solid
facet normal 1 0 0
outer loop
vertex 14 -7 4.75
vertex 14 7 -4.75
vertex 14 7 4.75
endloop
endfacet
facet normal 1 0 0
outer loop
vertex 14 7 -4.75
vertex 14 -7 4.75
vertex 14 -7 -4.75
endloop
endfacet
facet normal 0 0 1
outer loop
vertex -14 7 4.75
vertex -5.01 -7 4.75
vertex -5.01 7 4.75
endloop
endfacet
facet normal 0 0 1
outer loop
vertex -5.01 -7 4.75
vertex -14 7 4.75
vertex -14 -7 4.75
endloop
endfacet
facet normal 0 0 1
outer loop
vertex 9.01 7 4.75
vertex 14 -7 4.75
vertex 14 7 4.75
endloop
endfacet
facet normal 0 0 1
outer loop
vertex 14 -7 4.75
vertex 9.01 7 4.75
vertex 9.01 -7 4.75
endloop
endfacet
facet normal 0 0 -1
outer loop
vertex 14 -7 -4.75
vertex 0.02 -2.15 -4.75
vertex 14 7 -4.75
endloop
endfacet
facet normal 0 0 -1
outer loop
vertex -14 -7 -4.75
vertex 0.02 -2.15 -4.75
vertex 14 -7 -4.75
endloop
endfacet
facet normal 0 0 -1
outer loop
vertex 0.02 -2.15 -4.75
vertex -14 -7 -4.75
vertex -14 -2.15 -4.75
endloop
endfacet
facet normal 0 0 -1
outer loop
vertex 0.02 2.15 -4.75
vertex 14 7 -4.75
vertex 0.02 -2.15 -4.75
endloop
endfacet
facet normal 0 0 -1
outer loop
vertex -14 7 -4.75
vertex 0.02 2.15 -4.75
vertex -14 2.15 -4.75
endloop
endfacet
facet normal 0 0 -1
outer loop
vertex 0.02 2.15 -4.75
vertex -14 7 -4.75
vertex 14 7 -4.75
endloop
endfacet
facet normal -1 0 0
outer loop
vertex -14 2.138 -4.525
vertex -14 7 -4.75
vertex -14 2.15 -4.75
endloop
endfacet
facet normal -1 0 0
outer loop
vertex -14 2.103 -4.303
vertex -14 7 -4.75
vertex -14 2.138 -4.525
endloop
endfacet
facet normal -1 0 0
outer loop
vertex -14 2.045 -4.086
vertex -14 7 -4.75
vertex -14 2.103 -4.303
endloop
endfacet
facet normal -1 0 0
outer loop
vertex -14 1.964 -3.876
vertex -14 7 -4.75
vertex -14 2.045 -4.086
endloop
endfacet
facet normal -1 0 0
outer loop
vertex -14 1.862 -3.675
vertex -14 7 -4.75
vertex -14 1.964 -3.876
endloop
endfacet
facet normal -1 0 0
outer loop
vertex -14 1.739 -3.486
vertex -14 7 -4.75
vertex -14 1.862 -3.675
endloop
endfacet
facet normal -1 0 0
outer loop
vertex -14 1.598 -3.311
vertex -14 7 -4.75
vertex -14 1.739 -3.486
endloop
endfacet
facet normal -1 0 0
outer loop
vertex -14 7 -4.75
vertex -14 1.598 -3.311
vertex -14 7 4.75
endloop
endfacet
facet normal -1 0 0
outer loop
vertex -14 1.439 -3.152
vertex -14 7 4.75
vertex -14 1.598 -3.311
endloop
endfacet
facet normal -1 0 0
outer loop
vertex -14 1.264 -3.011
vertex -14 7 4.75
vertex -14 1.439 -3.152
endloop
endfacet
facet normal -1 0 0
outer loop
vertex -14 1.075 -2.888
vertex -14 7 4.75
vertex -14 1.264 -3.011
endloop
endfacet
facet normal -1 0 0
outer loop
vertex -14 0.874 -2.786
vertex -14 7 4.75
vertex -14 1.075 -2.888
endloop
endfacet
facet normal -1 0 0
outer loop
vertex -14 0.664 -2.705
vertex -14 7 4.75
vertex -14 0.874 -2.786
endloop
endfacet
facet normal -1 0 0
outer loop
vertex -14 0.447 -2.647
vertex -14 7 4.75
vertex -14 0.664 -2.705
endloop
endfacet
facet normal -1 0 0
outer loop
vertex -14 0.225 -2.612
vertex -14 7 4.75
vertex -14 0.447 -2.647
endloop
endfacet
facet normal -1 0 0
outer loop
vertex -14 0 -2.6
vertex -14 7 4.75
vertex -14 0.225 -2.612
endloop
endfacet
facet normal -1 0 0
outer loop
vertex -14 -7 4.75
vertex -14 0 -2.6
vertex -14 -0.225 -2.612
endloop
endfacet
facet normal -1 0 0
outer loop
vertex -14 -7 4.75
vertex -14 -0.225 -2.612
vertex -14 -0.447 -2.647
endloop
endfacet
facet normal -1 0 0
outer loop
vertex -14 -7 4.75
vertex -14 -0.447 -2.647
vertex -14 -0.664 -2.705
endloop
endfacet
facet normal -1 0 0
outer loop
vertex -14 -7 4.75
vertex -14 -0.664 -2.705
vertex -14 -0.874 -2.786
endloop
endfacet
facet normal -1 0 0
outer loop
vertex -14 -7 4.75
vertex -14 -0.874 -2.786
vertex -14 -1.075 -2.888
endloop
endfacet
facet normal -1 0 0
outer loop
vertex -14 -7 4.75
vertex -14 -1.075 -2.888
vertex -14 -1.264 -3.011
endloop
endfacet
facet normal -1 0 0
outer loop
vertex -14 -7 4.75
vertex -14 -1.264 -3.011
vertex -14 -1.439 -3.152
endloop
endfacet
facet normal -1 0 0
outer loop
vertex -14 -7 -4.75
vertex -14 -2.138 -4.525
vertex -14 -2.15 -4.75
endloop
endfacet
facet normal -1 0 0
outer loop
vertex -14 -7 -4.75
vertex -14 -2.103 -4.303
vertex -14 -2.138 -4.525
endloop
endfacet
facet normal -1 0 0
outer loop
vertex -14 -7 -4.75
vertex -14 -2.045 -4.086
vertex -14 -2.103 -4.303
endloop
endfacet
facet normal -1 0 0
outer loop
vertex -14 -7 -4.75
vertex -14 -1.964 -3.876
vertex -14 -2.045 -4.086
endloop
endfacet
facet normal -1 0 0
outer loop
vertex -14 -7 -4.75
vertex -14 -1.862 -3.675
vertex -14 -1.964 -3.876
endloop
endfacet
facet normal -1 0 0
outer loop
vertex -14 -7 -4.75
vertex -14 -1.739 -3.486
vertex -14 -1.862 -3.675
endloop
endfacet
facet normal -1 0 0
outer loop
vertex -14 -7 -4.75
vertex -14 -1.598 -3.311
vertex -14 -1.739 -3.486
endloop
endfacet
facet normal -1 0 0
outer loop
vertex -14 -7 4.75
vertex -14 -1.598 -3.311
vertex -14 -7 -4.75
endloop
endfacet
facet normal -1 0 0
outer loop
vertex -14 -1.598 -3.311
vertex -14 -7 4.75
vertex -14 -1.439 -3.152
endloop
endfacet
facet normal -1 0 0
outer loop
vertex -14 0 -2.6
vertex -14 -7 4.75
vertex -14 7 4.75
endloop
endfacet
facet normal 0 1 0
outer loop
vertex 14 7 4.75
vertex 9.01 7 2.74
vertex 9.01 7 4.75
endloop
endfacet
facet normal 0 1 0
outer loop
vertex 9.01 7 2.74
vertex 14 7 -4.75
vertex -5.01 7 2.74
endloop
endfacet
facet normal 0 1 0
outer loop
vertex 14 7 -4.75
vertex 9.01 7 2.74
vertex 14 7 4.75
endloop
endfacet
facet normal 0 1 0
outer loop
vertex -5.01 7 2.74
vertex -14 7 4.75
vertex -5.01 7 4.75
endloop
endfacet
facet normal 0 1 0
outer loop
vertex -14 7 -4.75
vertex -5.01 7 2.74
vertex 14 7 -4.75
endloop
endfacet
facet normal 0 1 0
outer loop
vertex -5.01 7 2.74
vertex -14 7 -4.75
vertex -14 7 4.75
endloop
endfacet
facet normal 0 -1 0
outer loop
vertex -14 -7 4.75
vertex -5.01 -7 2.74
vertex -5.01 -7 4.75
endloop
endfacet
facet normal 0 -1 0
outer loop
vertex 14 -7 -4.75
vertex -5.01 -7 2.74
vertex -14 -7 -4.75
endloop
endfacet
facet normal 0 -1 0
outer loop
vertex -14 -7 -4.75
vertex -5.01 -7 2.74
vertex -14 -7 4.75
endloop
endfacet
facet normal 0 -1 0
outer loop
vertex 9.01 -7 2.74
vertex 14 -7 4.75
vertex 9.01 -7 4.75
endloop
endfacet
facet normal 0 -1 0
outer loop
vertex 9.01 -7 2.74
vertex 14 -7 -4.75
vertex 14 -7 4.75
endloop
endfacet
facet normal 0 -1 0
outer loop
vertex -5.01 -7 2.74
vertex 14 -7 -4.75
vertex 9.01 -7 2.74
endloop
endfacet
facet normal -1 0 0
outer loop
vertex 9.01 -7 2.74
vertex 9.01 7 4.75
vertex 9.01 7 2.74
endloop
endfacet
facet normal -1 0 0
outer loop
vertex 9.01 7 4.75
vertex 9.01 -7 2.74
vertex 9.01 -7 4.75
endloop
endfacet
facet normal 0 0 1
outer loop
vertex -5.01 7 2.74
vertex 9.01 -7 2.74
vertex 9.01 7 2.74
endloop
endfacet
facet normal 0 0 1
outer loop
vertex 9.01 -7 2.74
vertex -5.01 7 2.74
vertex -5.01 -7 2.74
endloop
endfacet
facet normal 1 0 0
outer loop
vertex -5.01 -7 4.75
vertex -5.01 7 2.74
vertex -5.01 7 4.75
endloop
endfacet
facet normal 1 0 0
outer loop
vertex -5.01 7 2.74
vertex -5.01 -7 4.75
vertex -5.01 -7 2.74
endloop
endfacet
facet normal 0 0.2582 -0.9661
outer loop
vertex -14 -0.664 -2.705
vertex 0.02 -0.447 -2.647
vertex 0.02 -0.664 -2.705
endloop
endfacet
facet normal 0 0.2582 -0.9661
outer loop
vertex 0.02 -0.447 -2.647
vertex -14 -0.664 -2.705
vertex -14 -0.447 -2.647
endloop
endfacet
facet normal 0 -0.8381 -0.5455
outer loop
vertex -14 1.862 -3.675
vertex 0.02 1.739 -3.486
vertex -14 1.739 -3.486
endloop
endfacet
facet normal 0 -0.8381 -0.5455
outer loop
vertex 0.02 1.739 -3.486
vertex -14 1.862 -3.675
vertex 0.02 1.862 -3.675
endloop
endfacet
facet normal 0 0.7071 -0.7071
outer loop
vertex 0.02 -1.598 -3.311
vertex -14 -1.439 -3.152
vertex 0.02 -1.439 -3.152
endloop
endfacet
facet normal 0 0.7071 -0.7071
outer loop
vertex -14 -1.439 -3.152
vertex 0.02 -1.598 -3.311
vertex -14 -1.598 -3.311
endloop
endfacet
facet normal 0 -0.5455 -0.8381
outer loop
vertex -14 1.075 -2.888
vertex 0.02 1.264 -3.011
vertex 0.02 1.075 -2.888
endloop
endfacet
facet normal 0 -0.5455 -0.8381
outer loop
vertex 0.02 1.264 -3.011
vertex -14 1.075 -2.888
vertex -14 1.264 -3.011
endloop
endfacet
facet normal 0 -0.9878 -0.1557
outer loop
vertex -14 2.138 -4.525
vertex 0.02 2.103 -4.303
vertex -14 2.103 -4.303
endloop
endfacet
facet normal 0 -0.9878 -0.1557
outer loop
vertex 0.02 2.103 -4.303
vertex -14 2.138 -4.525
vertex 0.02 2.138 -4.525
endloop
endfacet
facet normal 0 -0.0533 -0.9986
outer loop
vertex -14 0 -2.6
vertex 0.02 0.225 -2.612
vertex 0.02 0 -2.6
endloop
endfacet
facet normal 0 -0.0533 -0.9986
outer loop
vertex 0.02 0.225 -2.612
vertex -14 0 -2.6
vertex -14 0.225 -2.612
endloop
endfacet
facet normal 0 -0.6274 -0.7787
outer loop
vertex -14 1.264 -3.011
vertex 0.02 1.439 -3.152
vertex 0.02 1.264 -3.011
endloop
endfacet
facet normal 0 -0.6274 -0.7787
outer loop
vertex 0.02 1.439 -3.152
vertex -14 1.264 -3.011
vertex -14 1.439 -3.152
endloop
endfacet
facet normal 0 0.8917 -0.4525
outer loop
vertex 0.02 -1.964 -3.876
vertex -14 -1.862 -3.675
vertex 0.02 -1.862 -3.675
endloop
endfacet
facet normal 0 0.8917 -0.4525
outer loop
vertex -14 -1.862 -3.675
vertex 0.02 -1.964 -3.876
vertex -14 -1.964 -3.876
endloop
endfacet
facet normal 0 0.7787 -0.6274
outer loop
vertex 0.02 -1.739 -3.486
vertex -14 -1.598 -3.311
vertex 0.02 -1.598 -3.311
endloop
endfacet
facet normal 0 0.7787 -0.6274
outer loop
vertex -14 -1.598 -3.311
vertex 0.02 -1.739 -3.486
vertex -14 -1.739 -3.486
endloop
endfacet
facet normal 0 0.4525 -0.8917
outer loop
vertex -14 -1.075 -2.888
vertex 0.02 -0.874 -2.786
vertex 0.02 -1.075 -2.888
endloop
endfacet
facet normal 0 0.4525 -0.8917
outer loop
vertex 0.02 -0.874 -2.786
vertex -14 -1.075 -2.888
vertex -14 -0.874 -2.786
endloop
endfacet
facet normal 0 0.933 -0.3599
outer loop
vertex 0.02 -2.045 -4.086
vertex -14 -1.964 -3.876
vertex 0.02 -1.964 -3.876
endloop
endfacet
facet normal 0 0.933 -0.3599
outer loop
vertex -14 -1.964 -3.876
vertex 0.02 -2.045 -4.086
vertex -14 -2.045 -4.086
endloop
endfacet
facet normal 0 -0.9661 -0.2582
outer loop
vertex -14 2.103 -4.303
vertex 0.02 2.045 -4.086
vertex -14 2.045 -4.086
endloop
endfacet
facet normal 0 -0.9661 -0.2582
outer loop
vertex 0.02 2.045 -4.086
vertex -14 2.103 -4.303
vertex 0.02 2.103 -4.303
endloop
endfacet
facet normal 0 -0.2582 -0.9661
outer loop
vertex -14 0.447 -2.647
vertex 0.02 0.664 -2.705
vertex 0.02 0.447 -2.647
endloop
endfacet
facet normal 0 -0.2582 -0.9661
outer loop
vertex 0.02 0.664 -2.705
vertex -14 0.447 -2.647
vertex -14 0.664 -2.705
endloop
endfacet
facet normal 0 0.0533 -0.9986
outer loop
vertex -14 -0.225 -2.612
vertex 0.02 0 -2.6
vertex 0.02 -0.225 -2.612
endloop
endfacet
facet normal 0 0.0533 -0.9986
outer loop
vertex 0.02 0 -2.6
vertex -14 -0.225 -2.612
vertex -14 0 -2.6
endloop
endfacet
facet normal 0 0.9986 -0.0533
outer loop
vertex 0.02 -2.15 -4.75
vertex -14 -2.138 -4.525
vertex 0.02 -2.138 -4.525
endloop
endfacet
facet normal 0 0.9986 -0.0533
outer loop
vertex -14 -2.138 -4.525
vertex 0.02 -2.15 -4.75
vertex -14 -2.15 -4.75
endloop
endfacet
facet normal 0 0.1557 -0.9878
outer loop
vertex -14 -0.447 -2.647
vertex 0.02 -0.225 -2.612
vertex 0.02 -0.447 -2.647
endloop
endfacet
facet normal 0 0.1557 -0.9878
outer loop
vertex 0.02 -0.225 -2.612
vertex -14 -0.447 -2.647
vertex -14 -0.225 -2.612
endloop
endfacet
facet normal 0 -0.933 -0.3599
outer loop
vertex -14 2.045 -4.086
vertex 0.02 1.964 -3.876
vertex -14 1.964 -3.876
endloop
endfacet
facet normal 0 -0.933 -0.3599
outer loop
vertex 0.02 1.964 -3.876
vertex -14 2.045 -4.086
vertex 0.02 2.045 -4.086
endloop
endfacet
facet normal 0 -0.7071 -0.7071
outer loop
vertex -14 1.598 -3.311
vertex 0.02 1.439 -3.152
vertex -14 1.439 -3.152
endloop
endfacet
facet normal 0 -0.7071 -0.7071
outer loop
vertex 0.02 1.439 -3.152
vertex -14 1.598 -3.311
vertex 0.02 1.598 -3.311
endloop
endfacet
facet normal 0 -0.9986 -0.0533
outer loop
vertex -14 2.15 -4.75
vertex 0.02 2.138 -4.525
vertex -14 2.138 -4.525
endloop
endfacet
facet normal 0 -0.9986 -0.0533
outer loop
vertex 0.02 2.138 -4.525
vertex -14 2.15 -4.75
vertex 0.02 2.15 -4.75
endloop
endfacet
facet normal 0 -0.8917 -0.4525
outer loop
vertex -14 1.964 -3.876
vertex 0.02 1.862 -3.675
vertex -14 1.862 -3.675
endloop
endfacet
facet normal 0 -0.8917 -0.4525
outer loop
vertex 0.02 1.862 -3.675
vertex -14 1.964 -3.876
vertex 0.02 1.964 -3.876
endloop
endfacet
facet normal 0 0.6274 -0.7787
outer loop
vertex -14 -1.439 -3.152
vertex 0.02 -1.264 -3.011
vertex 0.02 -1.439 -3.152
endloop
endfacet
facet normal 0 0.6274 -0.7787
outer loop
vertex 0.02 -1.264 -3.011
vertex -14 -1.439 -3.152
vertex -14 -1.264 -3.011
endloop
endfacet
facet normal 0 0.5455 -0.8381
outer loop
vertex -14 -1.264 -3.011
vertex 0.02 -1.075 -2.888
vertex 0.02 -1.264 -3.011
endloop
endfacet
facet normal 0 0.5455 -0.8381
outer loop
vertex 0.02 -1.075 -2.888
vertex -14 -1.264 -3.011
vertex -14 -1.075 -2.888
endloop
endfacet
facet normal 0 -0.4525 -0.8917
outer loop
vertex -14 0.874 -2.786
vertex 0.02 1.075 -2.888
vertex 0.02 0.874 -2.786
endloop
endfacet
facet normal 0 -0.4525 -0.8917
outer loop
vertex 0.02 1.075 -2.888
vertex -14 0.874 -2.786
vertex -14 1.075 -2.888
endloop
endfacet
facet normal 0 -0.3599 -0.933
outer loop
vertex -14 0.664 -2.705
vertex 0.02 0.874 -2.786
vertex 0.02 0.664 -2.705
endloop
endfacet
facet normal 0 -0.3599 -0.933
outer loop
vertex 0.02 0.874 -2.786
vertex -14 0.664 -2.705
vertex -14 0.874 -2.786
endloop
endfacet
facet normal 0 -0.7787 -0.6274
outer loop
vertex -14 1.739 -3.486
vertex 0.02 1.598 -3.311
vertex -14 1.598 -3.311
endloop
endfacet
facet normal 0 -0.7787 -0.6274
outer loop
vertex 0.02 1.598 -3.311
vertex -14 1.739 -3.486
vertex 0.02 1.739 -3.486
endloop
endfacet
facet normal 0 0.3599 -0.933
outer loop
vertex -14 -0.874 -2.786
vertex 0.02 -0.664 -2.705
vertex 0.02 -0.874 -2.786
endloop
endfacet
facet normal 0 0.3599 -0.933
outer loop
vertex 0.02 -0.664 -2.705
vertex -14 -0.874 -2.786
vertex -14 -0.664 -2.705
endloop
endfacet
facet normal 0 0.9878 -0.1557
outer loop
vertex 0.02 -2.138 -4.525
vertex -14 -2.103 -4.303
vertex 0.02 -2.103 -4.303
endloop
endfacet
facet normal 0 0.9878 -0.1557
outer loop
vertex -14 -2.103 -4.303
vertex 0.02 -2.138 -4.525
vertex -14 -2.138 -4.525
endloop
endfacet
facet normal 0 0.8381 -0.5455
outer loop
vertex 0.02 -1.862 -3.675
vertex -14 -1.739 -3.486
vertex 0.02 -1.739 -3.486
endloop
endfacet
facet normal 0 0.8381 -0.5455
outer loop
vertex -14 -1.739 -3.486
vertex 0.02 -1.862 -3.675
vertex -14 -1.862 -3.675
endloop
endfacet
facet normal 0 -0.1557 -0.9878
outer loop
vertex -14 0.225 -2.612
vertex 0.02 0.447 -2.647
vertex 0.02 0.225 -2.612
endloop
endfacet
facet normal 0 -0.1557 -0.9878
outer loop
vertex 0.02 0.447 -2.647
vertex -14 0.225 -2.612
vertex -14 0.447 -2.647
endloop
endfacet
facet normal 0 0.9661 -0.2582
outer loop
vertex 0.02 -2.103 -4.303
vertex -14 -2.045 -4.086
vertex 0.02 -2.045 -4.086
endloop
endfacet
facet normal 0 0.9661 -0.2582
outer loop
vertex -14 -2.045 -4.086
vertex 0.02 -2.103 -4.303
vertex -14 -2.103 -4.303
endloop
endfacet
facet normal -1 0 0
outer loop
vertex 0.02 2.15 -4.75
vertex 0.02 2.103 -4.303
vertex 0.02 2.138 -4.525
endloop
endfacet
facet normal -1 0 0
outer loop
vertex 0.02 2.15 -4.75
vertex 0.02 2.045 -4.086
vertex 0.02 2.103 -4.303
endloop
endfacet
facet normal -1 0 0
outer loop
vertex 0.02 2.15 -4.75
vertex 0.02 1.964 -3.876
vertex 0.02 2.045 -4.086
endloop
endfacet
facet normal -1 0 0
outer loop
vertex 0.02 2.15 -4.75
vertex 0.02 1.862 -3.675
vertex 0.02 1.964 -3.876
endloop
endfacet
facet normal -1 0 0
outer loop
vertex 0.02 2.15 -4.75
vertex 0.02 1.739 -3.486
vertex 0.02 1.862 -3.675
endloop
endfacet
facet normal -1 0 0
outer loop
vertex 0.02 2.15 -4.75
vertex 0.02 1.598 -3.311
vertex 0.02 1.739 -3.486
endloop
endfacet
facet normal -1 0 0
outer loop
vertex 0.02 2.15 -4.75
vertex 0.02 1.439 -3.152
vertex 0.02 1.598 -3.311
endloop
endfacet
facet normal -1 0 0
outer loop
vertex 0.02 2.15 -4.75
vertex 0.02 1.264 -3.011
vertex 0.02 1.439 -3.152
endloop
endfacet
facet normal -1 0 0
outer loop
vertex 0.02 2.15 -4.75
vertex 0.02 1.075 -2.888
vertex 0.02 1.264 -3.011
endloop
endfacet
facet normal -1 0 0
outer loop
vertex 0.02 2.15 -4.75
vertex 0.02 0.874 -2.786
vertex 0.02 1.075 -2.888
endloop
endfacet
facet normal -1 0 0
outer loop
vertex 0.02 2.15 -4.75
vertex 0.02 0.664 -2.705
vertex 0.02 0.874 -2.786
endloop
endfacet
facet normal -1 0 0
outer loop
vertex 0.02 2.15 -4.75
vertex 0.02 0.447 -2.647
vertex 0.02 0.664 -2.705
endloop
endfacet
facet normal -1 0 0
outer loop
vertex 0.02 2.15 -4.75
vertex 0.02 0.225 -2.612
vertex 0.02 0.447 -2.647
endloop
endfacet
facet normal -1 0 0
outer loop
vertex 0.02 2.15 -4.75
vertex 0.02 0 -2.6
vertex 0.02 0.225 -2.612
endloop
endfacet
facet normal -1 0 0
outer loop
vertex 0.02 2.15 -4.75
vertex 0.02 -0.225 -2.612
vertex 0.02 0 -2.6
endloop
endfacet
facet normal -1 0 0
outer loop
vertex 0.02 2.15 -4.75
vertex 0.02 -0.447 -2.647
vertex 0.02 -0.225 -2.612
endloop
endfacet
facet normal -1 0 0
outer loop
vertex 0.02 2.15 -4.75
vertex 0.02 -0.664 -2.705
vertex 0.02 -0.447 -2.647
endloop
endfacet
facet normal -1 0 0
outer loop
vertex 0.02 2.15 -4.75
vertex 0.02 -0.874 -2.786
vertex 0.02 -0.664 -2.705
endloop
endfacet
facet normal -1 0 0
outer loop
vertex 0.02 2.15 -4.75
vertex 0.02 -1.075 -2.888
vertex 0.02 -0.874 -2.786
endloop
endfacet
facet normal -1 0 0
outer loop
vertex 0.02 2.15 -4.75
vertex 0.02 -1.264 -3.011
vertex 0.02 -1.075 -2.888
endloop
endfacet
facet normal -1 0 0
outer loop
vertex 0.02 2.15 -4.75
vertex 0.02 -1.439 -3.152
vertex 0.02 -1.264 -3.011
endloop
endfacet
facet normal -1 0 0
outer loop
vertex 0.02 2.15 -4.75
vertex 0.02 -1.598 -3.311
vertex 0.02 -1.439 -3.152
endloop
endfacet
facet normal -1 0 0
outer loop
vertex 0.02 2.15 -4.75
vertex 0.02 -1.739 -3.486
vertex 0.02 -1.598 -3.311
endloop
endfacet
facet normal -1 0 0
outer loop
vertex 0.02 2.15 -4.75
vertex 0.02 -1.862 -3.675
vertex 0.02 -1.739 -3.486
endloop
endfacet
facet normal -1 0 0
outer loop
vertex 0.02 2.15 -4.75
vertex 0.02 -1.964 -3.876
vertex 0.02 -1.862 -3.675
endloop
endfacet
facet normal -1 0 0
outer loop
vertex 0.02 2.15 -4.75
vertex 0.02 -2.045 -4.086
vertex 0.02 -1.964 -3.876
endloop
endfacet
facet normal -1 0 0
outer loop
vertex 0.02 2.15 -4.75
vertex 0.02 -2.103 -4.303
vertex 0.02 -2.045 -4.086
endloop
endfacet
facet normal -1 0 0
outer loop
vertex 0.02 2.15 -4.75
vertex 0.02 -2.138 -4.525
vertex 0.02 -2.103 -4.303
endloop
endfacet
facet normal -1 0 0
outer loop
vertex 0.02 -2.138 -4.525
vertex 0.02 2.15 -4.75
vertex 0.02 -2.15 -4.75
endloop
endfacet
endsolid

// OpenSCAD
// Snap panel clip with a U-shaped panel slot.
$fn = 60;
eps = 0.02;
panel_t = 1.5;
clip_w = 14;
clip_l = 28;
clip_h = panel_t + 8;
slot = panel_t + 0.5;
difference() {
    cube([clip_l,clip_w,clip_h],center=true);
    translate([2,0,clip_h/2-slot/2]) cube([clip_l/2+eps,clip_w+2*eps,slot+eps],center=true);
    translate([-clip_l/2-eps,0,-clip_h/2]) rotate([0,90,0]) cylinder(d=4.3,h=clip_l/2+2*eps);
}
